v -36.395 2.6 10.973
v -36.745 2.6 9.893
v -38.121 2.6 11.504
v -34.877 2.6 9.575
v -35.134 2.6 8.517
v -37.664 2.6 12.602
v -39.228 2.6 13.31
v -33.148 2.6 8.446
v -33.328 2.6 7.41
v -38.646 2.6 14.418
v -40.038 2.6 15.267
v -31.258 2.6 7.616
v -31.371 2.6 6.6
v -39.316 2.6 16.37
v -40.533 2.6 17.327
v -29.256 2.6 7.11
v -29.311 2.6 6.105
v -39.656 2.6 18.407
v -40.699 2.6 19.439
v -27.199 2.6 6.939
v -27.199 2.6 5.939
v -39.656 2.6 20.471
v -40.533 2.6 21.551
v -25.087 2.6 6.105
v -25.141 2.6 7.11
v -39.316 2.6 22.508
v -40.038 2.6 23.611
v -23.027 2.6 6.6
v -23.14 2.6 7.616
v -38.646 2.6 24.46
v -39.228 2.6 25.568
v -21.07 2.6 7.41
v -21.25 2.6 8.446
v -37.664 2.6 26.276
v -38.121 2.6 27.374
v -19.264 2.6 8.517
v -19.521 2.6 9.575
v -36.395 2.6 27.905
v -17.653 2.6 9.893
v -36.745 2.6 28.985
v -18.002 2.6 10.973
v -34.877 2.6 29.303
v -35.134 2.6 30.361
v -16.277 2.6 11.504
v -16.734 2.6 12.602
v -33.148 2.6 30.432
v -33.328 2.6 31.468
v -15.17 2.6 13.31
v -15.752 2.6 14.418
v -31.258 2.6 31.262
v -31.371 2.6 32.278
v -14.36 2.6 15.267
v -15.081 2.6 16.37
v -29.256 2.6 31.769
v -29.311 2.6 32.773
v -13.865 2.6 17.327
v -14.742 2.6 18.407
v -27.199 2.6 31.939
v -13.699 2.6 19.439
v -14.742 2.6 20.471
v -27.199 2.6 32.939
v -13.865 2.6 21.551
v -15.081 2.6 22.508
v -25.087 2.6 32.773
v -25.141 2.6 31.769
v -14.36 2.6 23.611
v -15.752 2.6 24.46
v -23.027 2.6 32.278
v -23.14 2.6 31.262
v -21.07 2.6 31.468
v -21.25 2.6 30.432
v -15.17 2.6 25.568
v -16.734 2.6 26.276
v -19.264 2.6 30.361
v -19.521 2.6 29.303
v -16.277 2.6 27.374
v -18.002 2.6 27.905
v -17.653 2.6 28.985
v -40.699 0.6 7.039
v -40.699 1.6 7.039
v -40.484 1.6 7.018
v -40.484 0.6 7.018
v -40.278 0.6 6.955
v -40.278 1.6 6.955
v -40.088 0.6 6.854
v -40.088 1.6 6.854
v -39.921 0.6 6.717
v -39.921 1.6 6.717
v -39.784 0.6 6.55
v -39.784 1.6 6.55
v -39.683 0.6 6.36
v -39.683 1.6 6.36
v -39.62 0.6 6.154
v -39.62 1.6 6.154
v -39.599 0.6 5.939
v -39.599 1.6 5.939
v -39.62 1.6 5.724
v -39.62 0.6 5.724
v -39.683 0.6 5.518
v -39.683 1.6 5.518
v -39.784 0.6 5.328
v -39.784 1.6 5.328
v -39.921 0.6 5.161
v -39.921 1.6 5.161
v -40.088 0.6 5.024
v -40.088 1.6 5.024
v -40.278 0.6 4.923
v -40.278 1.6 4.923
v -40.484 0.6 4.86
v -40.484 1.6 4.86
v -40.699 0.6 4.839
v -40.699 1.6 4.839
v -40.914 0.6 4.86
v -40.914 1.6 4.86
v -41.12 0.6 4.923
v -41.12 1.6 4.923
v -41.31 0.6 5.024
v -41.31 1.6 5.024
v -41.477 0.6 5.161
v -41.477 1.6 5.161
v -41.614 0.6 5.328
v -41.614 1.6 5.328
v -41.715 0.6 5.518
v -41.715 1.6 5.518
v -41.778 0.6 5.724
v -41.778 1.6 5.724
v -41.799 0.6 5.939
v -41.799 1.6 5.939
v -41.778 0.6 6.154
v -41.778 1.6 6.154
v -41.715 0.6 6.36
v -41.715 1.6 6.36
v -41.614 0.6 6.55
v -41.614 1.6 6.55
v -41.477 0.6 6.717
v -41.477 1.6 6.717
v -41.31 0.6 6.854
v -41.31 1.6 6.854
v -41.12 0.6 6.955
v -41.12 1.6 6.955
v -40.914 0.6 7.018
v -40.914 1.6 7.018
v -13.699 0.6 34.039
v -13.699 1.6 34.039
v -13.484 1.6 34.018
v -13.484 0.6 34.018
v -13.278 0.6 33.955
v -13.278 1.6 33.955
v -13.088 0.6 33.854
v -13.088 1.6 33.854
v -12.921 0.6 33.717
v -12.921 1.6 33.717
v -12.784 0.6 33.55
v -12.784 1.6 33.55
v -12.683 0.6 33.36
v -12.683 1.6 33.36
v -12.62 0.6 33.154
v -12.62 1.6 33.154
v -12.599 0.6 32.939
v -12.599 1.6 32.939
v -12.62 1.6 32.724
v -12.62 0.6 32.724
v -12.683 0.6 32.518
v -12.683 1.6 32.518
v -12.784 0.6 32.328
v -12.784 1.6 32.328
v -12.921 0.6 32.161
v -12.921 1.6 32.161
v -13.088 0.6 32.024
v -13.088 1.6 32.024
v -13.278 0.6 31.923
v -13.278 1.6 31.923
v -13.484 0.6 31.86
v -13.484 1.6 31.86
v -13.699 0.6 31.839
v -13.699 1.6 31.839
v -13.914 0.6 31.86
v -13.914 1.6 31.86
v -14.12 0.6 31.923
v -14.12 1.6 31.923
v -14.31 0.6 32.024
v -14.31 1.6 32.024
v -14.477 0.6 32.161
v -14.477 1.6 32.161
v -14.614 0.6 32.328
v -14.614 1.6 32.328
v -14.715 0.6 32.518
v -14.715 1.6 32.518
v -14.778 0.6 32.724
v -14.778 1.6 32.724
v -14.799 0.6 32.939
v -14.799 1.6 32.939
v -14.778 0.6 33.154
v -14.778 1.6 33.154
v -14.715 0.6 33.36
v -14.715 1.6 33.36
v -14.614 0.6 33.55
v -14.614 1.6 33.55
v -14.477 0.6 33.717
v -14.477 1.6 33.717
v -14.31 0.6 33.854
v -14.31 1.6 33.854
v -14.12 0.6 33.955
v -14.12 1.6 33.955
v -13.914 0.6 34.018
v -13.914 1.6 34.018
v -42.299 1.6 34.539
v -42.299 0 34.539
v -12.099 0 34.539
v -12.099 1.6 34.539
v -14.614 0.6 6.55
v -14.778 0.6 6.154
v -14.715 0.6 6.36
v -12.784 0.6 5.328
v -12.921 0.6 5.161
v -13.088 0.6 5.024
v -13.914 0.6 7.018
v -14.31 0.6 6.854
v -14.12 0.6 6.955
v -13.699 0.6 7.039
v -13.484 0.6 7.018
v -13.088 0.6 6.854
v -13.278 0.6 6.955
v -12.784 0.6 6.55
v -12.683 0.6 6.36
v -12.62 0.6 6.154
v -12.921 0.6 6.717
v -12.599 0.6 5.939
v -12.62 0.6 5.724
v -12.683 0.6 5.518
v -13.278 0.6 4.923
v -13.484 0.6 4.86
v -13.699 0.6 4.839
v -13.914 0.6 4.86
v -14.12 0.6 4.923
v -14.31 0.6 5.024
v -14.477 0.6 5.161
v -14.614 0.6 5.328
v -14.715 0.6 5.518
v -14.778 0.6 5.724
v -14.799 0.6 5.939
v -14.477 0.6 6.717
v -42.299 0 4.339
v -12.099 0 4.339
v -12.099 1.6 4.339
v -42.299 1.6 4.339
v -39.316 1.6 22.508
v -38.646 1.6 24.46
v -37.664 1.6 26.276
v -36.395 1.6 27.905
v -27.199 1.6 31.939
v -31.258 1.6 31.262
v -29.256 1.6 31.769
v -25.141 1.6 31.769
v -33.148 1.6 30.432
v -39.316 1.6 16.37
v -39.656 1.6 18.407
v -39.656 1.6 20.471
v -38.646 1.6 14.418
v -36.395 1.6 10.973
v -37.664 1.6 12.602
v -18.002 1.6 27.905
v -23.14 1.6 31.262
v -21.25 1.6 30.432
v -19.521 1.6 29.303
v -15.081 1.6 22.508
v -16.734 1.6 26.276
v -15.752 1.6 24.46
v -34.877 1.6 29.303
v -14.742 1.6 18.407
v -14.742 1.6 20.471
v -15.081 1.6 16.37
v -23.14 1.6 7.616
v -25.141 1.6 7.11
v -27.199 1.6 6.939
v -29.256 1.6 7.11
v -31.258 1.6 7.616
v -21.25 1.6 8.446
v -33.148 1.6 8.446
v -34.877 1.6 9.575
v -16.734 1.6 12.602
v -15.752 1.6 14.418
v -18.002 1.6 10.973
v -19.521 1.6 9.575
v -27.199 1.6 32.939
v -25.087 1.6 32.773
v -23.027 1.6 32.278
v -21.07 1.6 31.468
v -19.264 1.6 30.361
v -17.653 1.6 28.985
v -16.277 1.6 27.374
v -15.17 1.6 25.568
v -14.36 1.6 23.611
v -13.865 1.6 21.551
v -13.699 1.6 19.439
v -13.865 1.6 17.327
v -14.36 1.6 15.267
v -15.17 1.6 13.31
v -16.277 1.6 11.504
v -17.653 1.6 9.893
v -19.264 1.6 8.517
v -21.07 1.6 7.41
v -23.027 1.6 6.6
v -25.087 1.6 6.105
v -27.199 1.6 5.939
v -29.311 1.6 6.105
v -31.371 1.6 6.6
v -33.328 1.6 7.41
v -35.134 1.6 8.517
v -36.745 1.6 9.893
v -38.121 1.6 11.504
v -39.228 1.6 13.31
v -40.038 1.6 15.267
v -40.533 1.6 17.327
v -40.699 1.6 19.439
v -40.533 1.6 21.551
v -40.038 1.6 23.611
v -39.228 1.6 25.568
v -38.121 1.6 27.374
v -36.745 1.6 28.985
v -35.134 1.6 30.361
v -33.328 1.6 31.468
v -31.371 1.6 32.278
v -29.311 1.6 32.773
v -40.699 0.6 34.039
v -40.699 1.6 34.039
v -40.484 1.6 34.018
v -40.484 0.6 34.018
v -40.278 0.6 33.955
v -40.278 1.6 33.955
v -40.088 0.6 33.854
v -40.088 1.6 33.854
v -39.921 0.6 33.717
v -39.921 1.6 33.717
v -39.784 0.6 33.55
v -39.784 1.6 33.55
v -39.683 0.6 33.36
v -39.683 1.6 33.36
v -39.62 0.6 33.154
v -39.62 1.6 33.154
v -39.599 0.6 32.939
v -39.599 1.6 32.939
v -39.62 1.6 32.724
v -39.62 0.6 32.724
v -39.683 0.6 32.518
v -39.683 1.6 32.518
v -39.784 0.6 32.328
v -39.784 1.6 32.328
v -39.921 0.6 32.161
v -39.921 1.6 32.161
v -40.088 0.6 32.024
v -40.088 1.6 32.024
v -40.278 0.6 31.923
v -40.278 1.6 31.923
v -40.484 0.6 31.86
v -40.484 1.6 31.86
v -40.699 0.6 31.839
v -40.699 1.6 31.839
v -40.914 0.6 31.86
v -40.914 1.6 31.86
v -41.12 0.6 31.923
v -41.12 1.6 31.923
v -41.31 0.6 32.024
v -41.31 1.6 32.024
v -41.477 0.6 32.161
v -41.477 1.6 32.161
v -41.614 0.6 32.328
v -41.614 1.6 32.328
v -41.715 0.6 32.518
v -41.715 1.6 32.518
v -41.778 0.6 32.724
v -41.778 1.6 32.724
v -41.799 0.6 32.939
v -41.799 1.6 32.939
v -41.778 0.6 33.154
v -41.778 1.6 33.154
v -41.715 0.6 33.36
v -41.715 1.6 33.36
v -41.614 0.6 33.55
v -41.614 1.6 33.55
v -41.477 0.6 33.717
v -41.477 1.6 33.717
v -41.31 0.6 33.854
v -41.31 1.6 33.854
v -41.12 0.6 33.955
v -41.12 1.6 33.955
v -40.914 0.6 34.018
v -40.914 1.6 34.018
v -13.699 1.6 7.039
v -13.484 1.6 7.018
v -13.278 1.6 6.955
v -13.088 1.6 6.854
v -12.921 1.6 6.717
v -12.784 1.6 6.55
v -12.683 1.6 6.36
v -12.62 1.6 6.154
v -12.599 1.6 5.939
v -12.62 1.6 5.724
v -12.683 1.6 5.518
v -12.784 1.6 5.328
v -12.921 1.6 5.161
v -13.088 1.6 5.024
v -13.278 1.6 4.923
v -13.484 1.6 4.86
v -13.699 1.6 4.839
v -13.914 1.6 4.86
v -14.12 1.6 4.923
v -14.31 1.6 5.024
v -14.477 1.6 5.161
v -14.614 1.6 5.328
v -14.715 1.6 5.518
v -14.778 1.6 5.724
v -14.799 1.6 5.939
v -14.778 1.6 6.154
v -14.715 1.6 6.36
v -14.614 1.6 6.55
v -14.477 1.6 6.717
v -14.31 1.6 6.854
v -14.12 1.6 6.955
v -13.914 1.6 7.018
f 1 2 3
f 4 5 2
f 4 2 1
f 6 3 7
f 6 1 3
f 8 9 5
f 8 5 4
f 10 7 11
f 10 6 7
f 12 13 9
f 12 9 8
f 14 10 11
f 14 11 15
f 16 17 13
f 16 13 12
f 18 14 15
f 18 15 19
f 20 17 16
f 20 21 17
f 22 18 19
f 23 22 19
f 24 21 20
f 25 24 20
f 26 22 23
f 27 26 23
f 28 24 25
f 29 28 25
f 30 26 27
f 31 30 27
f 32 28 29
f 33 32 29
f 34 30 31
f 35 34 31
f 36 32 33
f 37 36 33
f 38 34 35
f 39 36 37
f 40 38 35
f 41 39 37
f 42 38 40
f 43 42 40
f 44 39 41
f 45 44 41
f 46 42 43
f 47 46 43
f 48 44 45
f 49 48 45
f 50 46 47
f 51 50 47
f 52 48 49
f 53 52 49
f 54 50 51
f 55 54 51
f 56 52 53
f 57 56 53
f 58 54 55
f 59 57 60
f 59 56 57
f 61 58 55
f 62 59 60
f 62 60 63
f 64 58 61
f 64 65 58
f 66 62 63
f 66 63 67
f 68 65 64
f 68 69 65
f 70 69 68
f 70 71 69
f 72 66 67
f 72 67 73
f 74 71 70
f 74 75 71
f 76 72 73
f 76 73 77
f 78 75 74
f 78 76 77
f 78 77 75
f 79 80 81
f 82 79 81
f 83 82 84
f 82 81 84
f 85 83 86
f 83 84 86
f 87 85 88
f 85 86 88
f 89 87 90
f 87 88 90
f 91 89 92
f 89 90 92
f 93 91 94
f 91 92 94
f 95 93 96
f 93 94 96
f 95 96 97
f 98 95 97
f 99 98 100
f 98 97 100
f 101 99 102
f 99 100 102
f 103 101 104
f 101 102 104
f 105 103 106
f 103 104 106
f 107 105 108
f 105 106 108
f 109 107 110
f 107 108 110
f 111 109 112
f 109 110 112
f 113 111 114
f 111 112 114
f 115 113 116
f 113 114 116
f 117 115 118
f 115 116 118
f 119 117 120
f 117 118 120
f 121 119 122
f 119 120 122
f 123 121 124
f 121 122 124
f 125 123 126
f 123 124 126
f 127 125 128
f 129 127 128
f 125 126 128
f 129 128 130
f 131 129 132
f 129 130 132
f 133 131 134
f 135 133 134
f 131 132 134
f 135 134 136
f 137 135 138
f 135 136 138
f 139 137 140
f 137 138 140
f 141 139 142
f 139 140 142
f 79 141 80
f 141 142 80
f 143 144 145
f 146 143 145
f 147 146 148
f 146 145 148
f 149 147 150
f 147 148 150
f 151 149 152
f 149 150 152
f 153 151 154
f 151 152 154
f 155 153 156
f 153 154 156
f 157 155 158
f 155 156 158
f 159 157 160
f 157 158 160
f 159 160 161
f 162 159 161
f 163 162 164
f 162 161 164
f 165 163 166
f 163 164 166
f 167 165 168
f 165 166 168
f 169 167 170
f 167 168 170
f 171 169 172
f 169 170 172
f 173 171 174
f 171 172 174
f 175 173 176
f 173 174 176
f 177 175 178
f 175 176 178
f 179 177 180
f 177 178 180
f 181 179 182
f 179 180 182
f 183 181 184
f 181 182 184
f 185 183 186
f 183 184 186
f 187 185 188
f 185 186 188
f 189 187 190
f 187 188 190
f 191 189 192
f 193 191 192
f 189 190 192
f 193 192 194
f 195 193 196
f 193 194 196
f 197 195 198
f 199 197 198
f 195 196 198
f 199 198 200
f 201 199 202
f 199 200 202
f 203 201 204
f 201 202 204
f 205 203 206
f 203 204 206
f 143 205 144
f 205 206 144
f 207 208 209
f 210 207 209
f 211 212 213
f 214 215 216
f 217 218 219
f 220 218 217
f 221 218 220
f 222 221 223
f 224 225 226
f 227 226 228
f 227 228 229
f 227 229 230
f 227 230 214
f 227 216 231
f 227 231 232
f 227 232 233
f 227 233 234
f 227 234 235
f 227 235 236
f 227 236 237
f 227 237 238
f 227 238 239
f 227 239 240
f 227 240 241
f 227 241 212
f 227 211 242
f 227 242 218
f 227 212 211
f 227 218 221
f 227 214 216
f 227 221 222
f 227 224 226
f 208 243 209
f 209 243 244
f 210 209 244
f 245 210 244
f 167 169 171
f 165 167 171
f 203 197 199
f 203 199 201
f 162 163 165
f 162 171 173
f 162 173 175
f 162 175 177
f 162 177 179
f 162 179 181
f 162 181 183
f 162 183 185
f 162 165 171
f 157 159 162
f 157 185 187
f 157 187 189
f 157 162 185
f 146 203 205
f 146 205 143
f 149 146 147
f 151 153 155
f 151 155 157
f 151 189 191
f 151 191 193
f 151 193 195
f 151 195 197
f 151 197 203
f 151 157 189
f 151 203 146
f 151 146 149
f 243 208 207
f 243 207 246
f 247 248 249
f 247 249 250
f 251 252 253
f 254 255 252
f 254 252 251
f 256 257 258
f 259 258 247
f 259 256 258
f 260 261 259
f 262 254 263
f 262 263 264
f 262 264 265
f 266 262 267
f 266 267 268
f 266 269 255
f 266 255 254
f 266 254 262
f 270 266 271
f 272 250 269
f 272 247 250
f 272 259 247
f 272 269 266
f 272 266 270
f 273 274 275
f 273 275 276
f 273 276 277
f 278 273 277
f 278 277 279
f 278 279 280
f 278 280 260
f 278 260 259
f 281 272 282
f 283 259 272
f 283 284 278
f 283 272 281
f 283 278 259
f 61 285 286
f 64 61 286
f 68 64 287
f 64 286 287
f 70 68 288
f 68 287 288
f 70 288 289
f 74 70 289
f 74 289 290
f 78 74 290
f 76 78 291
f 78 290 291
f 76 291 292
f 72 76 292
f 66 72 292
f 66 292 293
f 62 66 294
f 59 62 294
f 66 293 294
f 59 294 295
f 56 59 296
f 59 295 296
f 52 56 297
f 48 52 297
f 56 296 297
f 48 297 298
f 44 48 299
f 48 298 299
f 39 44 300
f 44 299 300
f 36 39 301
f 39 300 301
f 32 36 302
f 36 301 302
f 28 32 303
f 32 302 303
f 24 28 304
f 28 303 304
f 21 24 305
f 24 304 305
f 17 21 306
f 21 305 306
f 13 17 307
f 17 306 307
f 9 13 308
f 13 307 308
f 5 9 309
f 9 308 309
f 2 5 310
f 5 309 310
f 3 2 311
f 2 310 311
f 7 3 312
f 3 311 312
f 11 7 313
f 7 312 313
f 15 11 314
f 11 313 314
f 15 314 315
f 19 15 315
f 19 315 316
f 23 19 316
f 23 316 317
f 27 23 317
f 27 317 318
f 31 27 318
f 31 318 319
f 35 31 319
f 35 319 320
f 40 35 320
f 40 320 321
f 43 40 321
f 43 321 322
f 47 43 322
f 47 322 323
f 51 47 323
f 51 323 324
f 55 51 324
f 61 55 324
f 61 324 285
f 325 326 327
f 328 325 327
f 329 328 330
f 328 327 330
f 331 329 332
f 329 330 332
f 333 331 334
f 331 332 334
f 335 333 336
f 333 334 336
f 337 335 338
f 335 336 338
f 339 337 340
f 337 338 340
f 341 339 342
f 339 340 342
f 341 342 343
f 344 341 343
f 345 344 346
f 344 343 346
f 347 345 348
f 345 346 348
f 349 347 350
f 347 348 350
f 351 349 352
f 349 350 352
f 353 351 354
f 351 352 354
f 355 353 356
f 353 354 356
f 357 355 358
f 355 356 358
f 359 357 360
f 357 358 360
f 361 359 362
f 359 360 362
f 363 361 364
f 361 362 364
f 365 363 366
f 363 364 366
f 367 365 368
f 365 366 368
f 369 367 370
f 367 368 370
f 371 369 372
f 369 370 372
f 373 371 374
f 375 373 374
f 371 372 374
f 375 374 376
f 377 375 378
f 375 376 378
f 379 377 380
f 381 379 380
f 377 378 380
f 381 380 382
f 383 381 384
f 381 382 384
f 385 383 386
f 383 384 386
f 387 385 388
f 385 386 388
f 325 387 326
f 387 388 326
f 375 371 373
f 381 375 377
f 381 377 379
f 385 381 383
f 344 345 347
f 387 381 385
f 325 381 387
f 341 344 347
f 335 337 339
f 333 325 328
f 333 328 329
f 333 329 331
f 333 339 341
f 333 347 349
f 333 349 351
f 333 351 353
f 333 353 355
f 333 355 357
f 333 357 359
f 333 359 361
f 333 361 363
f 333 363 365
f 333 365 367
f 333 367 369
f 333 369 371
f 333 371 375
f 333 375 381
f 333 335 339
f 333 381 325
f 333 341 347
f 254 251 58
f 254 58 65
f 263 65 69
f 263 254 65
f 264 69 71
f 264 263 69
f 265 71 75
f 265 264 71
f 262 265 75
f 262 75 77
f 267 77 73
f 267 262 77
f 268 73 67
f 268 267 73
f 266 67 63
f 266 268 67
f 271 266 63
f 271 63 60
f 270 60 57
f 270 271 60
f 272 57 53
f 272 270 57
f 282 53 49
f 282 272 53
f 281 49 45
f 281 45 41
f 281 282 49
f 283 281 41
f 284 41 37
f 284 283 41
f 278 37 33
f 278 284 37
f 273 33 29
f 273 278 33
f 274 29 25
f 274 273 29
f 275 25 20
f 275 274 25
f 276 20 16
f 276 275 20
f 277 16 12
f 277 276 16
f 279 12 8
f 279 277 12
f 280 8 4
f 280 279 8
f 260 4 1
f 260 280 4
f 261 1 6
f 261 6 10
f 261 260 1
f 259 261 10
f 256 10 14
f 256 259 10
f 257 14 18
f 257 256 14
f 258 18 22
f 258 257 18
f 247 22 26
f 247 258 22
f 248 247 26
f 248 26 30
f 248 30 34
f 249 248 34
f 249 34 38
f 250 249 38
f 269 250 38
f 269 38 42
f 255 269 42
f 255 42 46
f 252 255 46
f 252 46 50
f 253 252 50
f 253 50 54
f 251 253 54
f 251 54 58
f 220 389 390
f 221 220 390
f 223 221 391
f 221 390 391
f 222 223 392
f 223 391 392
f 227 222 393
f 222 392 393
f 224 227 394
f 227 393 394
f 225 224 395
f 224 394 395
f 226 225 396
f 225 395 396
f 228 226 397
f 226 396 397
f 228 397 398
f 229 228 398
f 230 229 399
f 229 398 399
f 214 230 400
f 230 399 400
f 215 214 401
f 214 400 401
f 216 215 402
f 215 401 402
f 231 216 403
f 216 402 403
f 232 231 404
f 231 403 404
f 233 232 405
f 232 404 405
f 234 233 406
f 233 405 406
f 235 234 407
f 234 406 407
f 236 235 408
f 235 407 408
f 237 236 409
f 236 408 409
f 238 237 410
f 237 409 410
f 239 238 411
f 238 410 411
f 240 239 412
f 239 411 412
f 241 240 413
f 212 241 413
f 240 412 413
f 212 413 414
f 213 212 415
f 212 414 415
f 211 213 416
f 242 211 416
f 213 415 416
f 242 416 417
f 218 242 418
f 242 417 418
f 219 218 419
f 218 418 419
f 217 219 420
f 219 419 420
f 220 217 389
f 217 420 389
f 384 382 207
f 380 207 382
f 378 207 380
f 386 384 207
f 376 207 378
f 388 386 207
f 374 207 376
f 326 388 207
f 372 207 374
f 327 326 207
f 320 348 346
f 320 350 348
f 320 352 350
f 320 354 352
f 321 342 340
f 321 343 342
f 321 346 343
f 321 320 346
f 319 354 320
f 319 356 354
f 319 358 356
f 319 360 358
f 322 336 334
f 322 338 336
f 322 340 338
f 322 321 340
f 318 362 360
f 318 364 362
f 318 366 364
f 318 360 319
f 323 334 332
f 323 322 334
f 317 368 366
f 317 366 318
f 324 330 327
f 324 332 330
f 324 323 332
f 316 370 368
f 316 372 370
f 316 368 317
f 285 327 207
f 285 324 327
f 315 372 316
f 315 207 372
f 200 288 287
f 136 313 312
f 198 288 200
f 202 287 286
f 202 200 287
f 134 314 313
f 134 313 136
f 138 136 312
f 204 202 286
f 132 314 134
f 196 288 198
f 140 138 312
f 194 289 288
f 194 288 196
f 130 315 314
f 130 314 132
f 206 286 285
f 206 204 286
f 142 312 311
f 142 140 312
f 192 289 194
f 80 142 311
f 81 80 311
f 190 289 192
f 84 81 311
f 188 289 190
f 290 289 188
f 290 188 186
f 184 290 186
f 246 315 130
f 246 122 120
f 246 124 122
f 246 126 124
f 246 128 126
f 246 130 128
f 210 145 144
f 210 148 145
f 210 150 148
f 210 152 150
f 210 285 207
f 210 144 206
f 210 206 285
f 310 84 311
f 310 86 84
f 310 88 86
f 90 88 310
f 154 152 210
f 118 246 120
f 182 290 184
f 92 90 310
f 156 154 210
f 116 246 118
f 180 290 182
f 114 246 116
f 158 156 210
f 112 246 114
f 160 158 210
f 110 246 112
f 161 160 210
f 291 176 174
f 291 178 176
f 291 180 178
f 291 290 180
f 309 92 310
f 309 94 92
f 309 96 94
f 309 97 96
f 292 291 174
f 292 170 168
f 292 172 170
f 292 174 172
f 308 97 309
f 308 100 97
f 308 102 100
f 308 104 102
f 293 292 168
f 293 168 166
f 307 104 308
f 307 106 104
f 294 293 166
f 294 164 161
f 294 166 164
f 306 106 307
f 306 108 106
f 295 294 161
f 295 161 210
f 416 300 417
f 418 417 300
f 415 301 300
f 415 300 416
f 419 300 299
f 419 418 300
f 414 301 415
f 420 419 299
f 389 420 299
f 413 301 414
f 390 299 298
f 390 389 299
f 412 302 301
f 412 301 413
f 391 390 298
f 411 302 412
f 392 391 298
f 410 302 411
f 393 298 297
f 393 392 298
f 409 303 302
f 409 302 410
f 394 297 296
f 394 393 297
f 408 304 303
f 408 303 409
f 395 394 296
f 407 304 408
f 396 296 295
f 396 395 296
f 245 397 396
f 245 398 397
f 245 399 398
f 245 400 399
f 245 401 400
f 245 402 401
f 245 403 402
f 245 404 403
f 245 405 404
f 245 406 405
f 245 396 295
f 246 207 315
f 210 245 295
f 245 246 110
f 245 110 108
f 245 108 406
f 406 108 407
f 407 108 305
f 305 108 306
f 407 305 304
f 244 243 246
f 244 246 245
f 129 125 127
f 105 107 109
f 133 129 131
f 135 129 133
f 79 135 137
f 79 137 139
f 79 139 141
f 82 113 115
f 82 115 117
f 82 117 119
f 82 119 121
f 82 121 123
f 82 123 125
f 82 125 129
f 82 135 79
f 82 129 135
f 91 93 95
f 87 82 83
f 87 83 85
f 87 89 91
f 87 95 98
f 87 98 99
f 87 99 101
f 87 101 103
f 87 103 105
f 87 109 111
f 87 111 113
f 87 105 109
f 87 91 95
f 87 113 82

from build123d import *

# Parameters (mm, degrees)
SKETCH1_W           = 30.2
SKETCH1_H           = 30.2
BOSS_EXTRUDE1_DEPTH = 1.6
SKETCH2_R           = 13.5
SKETCH2_R_2         = 12.5
BOSS_EXTRUDE2_DEPTH = 1
SKETCH3_R           = 1.1
CUT_EXTRUDE1_DEPTH  = 1


with BuildPart() as part:
    # Sketch1 → Boss-Extrude1 (new body)
    with BuildSketch(Plane(origin=(0, 0, 0), x_dir=(1, 0, 0), z_dir=(0, 1, 0))):
        with Locations((-27.198924567, -19.439049917)):
            Rectangle(SKETCH1_W, SKETCH1_H)
    extrude(amount=BOSS_EXTRUDE1_DEPTH)

    # Sketch2 → Boss-Extrude2 (add)
    with BuildSketch(Plane(origin=(0, 1.6, 0), x_dir=(1, 0, 0), z_dir=(0, 1, 0))):
        with Locations(Location((-27.198924567, -19.439049917, 0), (0, 0, 270))):
            Circle(SKETCH2_R)
        with Locations(Location((-27.198924567, -19.439049917, 0), (0, 0, 270))):
            Circle(SKETCH2_R_2, mode=Mode.SUBTRACT)
    extrude(amount=BOSS_EXTRUDE2_DEPTH)

    # Sketch3 → Cut-Extrude1 (cut)
    with BuildSketch(Plane(origin=(0, 1.6, 0), x_dir=(1, 0, 0), z_dir=(0, 1, 0))):
        with Locations(Location((-40.698924567, -32.939049917, 0), (0, 0, 270))):
            Circle(SKETCH3_R)
        with Locations(Location((-13.698924567, -32.939049917, 0), (0, 0, 270))):
            Circle(SKETCH3_R)
        with Locations(Location((-13.698924567, -5.939049917, 0), (0, 0, 270))):
            Circle(SKETCH3_R)
        with Locations(Location((-40.698924567, -5.939049917, 0), (0, 0, 270))):
            Circle(SKETCH3_R)
    extrude(amount=-CUT_EXTRUDE1_DEPTH, mode=Mode.SUBTRACT)


solid = part.part
